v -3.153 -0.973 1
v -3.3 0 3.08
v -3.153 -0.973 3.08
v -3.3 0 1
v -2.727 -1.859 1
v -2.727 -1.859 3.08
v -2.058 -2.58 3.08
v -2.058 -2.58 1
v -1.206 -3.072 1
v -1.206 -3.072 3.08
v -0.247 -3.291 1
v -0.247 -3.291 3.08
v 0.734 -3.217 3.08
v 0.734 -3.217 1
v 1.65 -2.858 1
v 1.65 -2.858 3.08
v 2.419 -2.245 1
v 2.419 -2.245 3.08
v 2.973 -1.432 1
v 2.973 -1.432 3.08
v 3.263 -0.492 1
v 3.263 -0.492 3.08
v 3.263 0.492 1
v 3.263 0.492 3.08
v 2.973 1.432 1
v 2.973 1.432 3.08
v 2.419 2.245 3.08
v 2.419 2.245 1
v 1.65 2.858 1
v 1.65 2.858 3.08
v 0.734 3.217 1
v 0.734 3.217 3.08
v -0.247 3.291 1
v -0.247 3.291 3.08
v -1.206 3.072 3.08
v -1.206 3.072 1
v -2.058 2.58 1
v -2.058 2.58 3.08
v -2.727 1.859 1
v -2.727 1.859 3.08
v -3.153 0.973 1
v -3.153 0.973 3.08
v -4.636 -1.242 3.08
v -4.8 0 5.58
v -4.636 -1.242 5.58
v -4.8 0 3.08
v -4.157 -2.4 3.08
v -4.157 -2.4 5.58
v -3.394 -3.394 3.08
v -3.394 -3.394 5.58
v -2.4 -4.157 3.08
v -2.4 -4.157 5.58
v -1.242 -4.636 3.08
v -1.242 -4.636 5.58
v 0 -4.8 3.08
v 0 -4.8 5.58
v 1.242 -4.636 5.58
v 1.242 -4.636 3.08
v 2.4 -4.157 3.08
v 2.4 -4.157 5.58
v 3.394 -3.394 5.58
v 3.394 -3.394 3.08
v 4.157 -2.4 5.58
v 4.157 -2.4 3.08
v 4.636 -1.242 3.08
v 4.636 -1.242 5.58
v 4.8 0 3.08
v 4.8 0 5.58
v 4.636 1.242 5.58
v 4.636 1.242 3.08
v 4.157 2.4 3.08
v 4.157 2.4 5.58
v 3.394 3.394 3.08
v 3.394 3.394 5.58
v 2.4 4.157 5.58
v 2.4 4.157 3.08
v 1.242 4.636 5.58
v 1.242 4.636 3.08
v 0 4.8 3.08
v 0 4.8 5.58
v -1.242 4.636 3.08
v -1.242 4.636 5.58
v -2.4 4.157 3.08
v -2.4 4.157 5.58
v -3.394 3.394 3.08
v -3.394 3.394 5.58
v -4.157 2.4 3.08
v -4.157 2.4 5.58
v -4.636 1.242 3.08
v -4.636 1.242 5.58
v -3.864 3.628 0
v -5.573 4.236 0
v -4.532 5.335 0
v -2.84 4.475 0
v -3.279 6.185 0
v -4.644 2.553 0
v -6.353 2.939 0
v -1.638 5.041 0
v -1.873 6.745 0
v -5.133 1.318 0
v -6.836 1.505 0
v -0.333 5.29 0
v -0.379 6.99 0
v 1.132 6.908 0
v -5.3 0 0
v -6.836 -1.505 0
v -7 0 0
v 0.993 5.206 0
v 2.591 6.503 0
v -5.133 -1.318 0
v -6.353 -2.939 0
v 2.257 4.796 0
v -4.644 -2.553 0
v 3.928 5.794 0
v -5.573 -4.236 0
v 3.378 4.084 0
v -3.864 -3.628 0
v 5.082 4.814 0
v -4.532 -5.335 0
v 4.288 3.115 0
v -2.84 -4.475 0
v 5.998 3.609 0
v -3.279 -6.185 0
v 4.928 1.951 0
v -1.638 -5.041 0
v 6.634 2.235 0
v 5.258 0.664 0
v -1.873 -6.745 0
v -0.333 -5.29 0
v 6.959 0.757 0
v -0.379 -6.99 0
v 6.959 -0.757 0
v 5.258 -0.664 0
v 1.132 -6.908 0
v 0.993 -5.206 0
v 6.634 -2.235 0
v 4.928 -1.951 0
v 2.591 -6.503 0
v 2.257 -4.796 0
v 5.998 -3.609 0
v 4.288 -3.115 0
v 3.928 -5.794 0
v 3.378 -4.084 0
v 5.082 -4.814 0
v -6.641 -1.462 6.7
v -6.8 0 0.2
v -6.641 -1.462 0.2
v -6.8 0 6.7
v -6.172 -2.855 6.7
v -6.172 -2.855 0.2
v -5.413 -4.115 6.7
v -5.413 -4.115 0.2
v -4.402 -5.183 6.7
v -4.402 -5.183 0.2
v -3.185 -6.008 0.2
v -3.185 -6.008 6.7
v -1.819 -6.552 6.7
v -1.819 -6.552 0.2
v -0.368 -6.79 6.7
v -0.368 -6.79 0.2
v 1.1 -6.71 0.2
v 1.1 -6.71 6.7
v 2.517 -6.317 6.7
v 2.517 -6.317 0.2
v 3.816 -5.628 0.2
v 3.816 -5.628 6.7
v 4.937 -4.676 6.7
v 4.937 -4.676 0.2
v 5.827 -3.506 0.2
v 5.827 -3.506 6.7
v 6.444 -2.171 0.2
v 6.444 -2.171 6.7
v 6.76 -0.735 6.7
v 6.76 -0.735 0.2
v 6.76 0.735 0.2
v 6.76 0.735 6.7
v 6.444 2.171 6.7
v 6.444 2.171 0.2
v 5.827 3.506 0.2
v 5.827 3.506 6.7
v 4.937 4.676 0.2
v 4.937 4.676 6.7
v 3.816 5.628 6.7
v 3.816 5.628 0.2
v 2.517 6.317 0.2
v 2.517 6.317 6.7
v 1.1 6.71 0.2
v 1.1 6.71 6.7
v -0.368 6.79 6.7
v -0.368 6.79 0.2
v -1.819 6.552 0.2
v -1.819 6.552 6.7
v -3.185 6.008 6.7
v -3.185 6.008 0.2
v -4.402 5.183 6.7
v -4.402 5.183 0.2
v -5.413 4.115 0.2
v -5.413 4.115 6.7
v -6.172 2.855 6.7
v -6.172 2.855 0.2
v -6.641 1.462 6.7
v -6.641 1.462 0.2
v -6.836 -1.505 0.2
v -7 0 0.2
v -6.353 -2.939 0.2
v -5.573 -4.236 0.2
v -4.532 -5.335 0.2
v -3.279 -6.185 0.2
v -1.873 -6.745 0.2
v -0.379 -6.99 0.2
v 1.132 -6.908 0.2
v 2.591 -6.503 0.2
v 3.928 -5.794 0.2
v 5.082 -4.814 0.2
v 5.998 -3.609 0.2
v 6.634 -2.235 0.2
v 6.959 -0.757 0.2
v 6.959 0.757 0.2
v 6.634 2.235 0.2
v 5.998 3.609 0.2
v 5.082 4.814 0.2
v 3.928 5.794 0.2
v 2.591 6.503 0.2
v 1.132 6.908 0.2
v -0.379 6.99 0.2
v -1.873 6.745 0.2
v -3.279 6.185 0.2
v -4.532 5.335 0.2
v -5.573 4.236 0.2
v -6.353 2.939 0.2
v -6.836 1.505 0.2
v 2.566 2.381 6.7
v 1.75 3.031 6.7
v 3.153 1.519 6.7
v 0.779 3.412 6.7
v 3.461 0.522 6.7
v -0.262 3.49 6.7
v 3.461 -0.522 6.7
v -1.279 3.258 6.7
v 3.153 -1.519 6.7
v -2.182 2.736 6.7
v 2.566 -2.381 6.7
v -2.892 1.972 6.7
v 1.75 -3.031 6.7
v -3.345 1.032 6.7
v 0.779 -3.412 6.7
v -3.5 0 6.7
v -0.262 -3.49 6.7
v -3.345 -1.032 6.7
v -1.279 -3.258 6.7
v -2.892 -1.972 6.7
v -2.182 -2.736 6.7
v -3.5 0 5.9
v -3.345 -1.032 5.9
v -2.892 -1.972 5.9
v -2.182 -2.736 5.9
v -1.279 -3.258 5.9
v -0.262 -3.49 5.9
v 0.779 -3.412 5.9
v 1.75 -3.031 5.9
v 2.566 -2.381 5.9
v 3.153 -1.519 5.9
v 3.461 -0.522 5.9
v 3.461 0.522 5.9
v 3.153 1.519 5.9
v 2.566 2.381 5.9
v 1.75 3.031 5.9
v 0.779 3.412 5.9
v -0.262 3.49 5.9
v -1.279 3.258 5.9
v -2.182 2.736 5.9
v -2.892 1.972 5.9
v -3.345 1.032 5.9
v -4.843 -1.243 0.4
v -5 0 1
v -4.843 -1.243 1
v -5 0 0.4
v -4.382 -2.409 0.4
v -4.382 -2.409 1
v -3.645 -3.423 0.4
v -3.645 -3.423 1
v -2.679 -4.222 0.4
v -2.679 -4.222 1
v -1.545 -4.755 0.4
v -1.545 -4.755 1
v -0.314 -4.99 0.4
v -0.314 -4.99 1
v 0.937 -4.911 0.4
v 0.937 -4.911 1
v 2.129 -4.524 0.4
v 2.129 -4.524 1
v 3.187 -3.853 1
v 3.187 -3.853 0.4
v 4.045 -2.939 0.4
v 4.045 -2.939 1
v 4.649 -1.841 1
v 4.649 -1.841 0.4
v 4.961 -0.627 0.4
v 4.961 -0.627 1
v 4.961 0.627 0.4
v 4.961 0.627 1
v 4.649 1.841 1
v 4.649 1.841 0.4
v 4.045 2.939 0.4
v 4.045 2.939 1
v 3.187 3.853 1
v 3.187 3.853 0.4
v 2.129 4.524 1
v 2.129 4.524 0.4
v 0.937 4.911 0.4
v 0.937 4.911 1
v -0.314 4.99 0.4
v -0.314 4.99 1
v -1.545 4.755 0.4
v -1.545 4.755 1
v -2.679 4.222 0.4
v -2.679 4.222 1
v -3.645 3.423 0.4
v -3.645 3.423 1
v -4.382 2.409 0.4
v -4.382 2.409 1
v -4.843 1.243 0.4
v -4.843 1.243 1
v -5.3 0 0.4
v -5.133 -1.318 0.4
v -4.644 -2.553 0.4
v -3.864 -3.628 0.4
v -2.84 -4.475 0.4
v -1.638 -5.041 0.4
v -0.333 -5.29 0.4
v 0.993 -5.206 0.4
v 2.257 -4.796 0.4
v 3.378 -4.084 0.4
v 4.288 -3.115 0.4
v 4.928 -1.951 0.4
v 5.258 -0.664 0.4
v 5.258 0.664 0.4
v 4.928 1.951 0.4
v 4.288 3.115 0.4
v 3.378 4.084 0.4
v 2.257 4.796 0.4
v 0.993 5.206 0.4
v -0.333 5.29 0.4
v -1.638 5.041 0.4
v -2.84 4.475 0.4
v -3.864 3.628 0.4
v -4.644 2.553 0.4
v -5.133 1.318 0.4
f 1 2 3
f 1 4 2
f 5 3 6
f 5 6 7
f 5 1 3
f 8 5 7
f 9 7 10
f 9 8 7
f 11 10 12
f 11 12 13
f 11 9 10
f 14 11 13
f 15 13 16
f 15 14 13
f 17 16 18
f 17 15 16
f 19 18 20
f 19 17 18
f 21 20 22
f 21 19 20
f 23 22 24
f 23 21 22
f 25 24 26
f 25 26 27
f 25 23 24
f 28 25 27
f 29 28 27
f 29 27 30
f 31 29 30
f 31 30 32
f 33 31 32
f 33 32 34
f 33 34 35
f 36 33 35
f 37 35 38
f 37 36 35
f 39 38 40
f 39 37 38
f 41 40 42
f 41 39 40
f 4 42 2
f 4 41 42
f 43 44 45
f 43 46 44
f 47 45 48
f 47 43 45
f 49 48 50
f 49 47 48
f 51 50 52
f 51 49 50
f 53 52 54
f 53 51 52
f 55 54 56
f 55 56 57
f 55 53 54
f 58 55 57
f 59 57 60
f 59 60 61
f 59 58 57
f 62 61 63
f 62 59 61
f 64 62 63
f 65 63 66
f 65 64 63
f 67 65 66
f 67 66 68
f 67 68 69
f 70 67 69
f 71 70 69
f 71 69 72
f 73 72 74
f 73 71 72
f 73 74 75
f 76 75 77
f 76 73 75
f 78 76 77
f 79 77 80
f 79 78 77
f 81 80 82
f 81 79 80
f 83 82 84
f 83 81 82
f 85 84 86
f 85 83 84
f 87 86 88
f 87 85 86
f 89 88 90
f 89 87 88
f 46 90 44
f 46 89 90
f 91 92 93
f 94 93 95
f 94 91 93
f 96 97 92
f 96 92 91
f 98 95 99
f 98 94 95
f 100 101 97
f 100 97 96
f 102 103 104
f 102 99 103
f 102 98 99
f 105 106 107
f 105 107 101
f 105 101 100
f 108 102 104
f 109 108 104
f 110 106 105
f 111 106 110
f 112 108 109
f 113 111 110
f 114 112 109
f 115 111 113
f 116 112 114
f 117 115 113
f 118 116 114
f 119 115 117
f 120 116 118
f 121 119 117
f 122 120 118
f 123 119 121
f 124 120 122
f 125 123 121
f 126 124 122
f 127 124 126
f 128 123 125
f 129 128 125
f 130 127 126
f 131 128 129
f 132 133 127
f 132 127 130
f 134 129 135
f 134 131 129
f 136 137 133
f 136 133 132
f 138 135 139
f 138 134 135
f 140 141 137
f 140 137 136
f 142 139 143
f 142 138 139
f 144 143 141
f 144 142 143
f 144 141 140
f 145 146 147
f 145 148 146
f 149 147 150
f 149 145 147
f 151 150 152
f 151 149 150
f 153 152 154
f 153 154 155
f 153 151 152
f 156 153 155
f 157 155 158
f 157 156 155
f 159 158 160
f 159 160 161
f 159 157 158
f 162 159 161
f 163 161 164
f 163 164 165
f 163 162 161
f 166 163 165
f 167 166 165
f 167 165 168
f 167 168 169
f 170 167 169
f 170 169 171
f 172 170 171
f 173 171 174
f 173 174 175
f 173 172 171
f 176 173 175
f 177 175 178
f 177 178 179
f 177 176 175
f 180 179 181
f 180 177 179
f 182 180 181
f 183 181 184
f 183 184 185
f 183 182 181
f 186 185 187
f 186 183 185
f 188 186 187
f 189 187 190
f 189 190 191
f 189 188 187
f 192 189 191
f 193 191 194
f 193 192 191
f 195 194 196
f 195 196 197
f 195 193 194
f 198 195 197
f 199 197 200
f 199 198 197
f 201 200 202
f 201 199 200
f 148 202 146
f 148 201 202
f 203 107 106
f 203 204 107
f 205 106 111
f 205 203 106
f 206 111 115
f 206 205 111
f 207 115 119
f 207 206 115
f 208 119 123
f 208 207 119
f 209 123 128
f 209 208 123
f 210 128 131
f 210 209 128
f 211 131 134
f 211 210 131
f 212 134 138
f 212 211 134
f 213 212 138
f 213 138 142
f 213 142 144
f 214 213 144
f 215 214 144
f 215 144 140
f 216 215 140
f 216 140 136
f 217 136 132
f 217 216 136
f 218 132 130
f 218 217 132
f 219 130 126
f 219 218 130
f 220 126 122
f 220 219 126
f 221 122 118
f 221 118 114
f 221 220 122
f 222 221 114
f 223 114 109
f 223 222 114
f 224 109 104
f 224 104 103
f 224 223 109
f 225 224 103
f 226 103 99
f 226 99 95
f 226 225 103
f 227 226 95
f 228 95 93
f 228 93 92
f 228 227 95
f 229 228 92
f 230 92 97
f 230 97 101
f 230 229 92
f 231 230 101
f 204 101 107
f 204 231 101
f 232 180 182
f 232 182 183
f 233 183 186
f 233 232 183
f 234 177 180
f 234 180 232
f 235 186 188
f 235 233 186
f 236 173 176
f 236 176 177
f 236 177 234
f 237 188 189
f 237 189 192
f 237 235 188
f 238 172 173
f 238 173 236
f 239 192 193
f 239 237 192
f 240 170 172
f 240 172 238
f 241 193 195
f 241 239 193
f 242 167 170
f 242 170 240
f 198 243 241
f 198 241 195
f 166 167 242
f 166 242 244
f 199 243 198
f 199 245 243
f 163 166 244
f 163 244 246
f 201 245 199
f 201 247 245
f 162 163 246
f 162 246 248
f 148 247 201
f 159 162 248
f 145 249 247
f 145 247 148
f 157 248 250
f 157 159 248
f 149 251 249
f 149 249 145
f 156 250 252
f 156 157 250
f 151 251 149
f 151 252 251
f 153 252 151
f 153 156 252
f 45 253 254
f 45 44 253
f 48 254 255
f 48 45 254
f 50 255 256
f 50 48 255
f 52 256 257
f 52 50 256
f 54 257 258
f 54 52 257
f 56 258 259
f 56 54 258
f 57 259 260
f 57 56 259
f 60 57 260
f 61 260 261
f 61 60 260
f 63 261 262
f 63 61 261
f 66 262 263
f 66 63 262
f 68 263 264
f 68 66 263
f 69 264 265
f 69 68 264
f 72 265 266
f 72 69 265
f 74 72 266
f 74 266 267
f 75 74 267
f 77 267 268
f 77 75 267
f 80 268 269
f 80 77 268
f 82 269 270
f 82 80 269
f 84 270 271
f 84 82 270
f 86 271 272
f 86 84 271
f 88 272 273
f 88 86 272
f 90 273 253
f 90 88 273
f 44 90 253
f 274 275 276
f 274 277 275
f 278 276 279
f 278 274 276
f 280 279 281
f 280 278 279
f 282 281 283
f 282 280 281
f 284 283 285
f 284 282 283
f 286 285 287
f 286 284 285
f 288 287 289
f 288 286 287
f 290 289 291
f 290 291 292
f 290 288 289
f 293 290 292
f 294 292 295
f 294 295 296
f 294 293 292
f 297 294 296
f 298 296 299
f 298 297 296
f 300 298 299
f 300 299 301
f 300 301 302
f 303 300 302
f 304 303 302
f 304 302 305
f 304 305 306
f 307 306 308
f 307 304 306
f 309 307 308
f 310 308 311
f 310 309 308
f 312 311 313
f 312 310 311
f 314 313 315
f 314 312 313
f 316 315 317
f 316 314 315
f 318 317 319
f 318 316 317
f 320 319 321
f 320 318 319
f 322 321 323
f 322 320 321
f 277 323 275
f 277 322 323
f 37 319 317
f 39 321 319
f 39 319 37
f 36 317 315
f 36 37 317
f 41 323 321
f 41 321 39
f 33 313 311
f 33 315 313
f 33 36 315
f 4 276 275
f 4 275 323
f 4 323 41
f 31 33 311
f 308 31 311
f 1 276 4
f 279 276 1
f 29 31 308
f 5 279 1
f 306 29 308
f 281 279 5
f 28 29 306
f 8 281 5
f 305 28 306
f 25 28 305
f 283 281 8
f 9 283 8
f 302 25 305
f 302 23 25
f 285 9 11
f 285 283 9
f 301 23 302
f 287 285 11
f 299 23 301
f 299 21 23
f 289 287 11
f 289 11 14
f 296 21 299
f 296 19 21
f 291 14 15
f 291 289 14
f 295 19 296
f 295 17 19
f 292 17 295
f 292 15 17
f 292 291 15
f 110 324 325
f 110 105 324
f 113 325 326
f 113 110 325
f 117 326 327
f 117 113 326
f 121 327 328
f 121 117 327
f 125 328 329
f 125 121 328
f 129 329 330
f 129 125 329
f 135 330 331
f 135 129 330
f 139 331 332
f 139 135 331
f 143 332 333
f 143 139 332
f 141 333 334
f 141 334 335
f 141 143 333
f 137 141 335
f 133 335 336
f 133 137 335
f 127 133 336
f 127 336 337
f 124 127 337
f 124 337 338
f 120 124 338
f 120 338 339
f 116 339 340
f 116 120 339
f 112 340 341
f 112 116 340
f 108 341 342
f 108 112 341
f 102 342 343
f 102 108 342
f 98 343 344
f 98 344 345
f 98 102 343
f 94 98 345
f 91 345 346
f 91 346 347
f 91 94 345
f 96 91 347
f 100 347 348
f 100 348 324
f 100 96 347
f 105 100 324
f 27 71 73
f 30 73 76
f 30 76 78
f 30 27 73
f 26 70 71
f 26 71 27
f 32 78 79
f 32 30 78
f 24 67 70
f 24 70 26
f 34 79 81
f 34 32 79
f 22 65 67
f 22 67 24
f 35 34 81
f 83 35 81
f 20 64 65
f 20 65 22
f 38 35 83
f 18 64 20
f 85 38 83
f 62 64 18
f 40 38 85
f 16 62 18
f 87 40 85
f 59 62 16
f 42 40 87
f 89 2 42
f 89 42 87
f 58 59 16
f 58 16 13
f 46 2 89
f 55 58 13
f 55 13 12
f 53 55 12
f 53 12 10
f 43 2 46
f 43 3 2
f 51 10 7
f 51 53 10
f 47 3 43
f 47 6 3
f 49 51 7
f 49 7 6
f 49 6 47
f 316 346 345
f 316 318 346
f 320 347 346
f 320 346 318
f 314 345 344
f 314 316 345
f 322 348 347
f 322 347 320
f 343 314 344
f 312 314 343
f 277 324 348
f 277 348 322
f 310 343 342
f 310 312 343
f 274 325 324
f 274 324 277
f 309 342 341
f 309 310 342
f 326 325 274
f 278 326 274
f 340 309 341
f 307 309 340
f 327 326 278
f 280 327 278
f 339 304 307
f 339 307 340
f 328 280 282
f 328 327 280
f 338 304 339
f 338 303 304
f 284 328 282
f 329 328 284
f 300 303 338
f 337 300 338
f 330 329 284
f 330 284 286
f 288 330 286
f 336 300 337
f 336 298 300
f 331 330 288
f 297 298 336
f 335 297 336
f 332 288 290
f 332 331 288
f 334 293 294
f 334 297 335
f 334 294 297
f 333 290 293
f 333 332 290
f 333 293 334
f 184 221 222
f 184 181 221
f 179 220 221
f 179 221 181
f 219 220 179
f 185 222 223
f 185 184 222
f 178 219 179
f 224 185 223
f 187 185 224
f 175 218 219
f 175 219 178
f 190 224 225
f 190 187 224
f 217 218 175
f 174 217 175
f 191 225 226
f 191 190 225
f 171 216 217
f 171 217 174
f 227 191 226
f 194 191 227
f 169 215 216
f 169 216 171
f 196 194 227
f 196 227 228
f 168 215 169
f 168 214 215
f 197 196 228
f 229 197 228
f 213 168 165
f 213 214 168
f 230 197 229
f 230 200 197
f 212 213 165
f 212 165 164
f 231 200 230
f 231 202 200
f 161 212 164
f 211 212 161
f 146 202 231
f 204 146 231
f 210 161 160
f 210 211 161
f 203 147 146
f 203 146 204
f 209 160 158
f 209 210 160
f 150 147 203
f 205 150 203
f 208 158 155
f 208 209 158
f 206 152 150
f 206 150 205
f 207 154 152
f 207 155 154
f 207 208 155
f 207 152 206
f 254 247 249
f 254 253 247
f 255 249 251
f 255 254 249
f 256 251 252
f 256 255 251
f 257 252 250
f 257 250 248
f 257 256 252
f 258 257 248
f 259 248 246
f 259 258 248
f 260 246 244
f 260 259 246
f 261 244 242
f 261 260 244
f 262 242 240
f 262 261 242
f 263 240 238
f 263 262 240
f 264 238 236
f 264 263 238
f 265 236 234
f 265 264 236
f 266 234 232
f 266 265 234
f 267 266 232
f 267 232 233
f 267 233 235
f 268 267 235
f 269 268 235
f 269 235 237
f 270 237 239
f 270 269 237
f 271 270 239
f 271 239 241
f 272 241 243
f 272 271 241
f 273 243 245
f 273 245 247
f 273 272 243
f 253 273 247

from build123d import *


with BuildPart() as part:
    # Sketch2 → Revolve1 (revolve)
    with BuildSketch(Plane(origin=(0, 0, 0), x_dir=(1, 0, 0), z_dir=(0, 1, 0))):
        Polygon((-3.5, -6.7), (-3.5, -5.9), (-4.8, -5.58), (-4.8, -3.08), (-3.3, -3.08), (-3.3, -1), (-5, -1), (-5, -0.4), (-5.3, -0.4), (-5.3, 0), (-7, 0), (-7, -0.2), (-6.8, -0.2), (-6.8, -6.7), align=None)
    revolve(axis=Axis((0, 0, 0), (0, 0, 1)))


solid = part.part
